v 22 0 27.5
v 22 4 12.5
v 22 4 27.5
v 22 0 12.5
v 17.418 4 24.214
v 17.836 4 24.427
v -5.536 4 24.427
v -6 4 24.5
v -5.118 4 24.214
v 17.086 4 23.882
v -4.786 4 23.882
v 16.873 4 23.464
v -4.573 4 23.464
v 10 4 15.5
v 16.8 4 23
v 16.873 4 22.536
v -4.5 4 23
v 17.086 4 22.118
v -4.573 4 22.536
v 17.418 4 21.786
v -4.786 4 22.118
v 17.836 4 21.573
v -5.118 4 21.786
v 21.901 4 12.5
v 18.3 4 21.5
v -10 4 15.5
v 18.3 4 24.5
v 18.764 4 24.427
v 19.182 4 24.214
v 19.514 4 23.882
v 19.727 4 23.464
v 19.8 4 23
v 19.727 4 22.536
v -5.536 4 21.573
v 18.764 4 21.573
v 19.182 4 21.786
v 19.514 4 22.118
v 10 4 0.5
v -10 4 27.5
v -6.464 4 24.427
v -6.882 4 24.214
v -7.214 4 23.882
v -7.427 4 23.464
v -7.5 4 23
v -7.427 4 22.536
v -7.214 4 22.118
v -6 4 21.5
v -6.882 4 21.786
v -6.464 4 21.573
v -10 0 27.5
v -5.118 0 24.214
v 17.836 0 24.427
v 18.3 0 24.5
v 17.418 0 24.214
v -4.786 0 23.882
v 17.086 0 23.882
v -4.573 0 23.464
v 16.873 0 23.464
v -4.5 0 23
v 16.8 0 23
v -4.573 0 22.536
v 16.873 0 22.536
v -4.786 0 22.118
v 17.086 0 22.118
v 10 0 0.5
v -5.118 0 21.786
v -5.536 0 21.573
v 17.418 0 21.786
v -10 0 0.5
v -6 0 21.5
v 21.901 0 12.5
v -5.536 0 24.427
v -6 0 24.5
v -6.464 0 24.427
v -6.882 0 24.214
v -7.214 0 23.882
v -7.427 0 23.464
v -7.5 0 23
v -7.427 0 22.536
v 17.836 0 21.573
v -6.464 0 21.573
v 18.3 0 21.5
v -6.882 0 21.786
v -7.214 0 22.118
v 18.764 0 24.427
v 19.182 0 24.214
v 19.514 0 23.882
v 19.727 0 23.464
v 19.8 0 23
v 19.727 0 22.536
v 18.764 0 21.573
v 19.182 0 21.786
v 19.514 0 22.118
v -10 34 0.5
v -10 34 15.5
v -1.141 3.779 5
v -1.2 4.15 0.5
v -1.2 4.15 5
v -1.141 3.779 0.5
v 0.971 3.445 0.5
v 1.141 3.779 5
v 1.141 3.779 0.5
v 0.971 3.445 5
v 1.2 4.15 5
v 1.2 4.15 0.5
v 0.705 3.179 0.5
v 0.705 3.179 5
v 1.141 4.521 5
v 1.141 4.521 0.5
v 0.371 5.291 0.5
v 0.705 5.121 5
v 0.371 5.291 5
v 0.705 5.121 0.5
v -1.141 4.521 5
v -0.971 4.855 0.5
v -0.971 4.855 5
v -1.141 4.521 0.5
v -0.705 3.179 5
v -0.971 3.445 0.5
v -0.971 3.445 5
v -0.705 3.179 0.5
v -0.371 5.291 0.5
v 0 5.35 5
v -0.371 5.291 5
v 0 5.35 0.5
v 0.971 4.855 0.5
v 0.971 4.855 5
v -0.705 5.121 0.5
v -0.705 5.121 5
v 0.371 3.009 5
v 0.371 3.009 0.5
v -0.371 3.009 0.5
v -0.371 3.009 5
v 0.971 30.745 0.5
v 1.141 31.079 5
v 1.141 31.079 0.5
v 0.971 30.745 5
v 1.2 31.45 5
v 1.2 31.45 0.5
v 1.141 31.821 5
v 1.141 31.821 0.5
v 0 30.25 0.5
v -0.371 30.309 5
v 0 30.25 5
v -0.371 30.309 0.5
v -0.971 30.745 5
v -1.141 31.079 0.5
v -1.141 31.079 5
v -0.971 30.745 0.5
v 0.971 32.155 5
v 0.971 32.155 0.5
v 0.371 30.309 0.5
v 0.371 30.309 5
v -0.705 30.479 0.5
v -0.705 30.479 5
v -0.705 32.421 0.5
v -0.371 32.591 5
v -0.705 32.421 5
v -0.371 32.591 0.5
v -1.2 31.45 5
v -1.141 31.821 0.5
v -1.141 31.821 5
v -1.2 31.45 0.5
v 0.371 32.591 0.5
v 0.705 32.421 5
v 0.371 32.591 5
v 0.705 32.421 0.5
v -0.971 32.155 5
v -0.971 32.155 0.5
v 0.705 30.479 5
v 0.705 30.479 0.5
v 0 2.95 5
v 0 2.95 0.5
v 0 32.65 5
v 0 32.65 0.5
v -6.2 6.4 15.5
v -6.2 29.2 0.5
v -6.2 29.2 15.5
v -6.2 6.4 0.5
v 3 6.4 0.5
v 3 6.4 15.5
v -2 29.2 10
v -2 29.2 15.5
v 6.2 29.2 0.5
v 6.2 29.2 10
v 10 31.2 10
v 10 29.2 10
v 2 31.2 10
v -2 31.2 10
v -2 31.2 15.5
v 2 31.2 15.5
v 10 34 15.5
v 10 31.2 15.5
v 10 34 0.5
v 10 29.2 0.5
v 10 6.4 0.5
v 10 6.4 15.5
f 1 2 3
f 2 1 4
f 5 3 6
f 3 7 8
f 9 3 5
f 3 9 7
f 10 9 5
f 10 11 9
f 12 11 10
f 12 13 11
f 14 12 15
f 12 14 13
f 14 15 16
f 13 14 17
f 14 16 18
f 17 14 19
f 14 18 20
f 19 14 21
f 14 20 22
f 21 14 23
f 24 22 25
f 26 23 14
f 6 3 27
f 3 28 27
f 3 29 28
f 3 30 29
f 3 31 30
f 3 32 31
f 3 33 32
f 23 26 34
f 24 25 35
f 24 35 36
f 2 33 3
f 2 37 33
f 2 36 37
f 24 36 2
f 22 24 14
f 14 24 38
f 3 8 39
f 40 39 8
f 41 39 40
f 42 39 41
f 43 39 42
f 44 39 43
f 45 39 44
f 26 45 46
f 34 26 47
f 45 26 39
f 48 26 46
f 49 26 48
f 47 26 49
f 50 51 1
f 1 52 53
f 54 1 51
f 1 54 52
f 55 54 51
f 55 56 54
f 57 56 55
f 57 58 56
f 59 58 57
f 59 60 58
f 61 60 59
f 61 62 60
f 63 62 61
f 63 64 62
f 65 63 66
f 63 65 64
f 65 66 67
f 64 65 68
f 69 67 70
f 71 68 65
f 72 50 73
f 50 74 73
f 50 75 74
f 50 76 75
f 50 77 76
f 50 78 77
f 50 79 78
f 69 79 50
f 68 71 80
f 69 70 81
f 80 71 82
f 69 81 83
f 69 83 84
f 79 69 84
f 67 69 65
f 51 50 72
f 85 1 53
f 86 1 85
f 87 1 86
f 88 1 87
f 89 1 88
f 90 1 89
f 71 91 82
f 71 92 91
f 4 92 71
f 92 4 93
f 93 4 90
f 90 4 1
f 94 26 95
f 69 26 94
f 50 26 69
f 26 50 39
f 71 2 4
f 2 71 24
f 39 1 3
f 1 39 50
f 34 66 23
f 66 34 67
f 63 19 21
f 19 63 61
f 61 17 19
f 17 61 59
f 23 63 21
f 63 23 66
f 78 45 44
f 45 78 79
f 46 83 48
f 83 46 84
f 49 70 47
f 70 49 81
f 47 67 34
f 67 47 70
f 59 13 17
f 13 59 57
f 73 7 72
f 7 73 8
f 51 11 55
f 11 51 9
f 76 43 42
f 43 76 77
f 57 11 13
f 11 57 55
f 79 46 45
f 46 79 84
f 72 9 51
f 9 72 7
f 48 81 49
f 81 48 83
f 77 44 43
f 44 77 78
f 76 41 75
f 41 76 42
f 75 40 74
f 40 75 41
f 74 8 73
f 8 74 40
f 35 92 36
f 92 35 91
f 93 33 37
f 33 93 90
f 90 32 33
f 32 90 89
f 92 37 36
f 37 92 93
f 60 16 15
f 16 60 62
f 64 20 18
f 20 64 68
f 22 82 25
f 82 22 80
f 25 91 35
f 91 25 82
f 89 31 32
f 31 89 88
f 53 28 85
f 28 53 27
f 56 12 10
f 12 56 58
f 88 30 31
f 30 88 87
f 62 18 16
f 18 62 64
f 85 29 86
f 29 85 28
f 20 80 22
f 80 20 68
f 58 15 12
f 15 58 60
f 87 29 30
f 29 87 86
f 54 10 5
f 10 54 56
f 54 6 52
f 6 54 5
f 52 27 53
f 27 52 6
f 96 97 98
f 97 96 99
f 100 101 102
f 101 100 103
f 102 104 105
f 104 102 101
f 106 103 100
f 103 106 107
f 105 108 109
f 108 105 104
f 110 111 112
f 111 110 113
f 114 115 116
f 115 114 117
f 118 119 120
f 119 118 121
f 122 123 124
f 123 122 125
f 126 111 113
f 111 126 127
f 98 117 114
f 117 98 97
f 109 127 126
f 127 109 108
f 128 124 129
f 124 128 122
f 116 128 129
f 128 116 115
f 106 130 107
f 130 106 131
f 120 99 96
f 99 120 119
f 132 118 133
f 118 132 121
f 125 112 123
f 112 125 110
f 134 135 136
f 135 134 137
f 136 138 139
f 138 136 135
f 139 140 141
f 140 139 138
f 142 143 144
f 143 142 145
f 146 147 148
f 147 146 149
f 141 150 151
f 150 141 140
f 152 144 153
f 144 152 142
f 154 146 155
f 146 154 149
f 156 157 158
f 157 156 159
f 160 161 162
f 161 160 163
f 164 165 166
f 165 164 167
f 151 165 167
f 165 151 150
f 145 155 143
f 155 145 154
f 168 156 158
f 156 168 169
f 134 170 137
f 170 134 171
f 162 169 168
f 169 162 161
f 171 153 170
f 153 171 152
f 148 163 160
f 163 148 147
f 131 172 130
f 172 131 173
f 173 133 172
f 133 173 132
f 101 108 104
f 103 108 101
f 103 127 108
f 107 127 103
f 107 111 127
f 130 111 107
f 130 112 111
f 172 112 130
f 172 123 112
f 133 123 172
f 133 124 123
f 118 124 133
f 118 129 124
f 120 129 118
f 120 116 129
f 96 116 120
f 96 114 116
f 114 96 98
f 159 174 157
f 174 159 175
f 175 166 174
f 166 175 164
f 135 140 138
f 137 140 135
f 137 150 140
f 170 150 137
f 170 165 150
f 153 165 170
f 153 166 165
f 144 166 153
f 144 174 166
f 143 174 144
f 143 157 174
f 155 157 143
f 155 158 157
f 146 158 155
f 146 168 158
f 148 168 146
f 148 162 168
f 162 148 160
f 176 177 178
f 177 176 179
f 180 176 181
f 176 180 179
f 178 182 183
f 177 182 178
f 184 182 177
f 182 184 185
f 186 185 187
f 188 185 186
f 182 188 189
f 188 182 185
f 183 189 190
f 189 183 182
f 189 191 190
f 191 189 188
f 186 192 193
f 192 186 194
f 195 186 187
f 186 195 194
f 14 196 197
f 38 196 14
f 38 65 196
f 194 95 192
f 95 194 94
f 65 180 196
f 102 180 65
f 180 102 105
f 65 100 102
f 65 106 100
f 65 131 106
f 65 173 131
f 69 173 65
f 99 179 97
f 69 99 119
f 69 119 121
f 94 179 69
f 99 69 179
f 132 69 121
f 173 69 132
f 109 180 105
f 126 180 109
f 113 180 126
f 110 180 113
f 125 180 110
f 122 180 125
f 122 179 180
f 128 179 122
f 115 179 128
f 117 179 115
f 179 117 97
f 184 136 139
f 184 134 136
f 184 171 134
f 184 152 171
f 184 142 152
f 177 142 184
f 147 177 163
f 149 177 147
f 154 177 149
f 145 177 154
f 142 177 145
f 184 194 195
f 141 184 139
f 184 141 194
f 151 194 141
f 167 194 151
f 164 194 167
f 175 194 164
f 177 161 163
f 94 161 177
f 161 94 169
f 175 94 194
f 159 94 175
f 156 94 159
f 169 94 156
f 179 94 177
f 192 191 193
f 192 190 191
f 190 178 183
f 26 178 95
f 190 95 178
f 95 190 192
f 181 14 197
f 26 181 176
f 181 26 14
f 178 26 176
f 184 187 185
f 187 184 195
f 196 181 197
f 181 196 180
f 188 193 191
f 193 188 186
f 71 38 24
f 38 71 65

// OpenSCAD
use <MCAD/triangles.scad>


// alternative printing position 
//translate([0, 0, 10]) rotate([0,-90,0])
rotate([-90,0,0])
union() {
    translate([10,-12.6, 0]) triangle(12.1, 12, 4);
    difference() {
        translate([6,-20, 2]) #cube([32,15,4], true);
        translate([-6,-23, -1]) #cylinder(r=3/2, h=6, $fn=20);
        translate([-6+24.3,-23, -1]) #cylinder(r=3/2, h=6, $fn=20);
    }
    
    translate([0,0, 34-11]) difference() {
        translate([0,-8, -6]) cube([20,15,34],true);
        #MicroServoSG90(0,[-90,0,0],1,2);
        translate([8,-8, -5.2]) cube([10,16,22.8],true);
        translate([6,-13, 7.2]) #cube([10,6,2],true);
    }
}/**/


/**
 * Tower Pro Micro Servo SG90
 *
 * @param vector position The position vector
 * @param vector rotation The rotation vector
 * @param boolean screws If defined then "screws" will be added and when the module is differenced() from something if will have holes for the screws
 * @param number cable_start : 0:no cable, 1: horizontal cable start 2:vertical cable start
 */
module MicroServoSG90(position, rotation, screws = 0, cable_start = 0)
{
	servoX = 12.4;
	servoY = 22.8;
	servoZ = 22.8;
	earsY = 32.3;

	translate(position) 
	{
		rotate(rotation) 
		{
			translate([0,-0.5*servoX,-16]) union() 
			{
				/* Box */ 
				translate([-0.5*servoX,0,0]) cube([servoX, servoY, servoZ], false); 
				
				/* Ears */
				translate([-0.5*servoX,-0.5*(earsY-servoY),16]) 
				{ 
					difference() {
						cube([servoX, earsY, 2.6], false);
						translate([servoX/2,earsY-2.5,-1]) cylinder(r=2.4/2, h=6, $fn=20);
						translate([servoX/2,2.5,-1]) cylinder(r=2.4/2, h=6, $fn=20);
						translate([servoX/2-0.5,earsY-2,-1]) cube([1,2,6]);
						translate([servoX/2-0.5,0,-1]) cube([1,2,6]);
					}
				}		
				/* Show Cable start */
				if (cable_start==1)  { #translate([-2,-6,4.5]) cube([4,6,1], false); } // horizontal
				if (cable_start==2)  { #translate([-2,-2,0]) cube([4,2,6], false); }   // Vertical

				/* Show screws */
				if (screws > 0) {
					translate([-0.5*servoX,-0.5*(earsY-servoY),16]) { 
						translate([servoX/2,earsY-2.5,-5]) #cylinder(r=2.4/2, h=8, $fn=20);
						translate([servoX/2,2.5,-5]) #cylinder(r=2.4/2, h=8, $fn=20);
					}
				}

				/* Top Gears */
				translate([0,servoX,servoZ])	   cylinder(d=5.6, h=4.5, $fn=50); 
				translate([0,0.5*servoX,servoZ])	cylinder(d=servoX, h=4.5, $fn=50);
				
				/* 	Axe */
				translate([0,0.5*servoX,servoZ])	cylinder(d=5, h=4.5+3 , $fn=50);
			}
		}
	}
}
